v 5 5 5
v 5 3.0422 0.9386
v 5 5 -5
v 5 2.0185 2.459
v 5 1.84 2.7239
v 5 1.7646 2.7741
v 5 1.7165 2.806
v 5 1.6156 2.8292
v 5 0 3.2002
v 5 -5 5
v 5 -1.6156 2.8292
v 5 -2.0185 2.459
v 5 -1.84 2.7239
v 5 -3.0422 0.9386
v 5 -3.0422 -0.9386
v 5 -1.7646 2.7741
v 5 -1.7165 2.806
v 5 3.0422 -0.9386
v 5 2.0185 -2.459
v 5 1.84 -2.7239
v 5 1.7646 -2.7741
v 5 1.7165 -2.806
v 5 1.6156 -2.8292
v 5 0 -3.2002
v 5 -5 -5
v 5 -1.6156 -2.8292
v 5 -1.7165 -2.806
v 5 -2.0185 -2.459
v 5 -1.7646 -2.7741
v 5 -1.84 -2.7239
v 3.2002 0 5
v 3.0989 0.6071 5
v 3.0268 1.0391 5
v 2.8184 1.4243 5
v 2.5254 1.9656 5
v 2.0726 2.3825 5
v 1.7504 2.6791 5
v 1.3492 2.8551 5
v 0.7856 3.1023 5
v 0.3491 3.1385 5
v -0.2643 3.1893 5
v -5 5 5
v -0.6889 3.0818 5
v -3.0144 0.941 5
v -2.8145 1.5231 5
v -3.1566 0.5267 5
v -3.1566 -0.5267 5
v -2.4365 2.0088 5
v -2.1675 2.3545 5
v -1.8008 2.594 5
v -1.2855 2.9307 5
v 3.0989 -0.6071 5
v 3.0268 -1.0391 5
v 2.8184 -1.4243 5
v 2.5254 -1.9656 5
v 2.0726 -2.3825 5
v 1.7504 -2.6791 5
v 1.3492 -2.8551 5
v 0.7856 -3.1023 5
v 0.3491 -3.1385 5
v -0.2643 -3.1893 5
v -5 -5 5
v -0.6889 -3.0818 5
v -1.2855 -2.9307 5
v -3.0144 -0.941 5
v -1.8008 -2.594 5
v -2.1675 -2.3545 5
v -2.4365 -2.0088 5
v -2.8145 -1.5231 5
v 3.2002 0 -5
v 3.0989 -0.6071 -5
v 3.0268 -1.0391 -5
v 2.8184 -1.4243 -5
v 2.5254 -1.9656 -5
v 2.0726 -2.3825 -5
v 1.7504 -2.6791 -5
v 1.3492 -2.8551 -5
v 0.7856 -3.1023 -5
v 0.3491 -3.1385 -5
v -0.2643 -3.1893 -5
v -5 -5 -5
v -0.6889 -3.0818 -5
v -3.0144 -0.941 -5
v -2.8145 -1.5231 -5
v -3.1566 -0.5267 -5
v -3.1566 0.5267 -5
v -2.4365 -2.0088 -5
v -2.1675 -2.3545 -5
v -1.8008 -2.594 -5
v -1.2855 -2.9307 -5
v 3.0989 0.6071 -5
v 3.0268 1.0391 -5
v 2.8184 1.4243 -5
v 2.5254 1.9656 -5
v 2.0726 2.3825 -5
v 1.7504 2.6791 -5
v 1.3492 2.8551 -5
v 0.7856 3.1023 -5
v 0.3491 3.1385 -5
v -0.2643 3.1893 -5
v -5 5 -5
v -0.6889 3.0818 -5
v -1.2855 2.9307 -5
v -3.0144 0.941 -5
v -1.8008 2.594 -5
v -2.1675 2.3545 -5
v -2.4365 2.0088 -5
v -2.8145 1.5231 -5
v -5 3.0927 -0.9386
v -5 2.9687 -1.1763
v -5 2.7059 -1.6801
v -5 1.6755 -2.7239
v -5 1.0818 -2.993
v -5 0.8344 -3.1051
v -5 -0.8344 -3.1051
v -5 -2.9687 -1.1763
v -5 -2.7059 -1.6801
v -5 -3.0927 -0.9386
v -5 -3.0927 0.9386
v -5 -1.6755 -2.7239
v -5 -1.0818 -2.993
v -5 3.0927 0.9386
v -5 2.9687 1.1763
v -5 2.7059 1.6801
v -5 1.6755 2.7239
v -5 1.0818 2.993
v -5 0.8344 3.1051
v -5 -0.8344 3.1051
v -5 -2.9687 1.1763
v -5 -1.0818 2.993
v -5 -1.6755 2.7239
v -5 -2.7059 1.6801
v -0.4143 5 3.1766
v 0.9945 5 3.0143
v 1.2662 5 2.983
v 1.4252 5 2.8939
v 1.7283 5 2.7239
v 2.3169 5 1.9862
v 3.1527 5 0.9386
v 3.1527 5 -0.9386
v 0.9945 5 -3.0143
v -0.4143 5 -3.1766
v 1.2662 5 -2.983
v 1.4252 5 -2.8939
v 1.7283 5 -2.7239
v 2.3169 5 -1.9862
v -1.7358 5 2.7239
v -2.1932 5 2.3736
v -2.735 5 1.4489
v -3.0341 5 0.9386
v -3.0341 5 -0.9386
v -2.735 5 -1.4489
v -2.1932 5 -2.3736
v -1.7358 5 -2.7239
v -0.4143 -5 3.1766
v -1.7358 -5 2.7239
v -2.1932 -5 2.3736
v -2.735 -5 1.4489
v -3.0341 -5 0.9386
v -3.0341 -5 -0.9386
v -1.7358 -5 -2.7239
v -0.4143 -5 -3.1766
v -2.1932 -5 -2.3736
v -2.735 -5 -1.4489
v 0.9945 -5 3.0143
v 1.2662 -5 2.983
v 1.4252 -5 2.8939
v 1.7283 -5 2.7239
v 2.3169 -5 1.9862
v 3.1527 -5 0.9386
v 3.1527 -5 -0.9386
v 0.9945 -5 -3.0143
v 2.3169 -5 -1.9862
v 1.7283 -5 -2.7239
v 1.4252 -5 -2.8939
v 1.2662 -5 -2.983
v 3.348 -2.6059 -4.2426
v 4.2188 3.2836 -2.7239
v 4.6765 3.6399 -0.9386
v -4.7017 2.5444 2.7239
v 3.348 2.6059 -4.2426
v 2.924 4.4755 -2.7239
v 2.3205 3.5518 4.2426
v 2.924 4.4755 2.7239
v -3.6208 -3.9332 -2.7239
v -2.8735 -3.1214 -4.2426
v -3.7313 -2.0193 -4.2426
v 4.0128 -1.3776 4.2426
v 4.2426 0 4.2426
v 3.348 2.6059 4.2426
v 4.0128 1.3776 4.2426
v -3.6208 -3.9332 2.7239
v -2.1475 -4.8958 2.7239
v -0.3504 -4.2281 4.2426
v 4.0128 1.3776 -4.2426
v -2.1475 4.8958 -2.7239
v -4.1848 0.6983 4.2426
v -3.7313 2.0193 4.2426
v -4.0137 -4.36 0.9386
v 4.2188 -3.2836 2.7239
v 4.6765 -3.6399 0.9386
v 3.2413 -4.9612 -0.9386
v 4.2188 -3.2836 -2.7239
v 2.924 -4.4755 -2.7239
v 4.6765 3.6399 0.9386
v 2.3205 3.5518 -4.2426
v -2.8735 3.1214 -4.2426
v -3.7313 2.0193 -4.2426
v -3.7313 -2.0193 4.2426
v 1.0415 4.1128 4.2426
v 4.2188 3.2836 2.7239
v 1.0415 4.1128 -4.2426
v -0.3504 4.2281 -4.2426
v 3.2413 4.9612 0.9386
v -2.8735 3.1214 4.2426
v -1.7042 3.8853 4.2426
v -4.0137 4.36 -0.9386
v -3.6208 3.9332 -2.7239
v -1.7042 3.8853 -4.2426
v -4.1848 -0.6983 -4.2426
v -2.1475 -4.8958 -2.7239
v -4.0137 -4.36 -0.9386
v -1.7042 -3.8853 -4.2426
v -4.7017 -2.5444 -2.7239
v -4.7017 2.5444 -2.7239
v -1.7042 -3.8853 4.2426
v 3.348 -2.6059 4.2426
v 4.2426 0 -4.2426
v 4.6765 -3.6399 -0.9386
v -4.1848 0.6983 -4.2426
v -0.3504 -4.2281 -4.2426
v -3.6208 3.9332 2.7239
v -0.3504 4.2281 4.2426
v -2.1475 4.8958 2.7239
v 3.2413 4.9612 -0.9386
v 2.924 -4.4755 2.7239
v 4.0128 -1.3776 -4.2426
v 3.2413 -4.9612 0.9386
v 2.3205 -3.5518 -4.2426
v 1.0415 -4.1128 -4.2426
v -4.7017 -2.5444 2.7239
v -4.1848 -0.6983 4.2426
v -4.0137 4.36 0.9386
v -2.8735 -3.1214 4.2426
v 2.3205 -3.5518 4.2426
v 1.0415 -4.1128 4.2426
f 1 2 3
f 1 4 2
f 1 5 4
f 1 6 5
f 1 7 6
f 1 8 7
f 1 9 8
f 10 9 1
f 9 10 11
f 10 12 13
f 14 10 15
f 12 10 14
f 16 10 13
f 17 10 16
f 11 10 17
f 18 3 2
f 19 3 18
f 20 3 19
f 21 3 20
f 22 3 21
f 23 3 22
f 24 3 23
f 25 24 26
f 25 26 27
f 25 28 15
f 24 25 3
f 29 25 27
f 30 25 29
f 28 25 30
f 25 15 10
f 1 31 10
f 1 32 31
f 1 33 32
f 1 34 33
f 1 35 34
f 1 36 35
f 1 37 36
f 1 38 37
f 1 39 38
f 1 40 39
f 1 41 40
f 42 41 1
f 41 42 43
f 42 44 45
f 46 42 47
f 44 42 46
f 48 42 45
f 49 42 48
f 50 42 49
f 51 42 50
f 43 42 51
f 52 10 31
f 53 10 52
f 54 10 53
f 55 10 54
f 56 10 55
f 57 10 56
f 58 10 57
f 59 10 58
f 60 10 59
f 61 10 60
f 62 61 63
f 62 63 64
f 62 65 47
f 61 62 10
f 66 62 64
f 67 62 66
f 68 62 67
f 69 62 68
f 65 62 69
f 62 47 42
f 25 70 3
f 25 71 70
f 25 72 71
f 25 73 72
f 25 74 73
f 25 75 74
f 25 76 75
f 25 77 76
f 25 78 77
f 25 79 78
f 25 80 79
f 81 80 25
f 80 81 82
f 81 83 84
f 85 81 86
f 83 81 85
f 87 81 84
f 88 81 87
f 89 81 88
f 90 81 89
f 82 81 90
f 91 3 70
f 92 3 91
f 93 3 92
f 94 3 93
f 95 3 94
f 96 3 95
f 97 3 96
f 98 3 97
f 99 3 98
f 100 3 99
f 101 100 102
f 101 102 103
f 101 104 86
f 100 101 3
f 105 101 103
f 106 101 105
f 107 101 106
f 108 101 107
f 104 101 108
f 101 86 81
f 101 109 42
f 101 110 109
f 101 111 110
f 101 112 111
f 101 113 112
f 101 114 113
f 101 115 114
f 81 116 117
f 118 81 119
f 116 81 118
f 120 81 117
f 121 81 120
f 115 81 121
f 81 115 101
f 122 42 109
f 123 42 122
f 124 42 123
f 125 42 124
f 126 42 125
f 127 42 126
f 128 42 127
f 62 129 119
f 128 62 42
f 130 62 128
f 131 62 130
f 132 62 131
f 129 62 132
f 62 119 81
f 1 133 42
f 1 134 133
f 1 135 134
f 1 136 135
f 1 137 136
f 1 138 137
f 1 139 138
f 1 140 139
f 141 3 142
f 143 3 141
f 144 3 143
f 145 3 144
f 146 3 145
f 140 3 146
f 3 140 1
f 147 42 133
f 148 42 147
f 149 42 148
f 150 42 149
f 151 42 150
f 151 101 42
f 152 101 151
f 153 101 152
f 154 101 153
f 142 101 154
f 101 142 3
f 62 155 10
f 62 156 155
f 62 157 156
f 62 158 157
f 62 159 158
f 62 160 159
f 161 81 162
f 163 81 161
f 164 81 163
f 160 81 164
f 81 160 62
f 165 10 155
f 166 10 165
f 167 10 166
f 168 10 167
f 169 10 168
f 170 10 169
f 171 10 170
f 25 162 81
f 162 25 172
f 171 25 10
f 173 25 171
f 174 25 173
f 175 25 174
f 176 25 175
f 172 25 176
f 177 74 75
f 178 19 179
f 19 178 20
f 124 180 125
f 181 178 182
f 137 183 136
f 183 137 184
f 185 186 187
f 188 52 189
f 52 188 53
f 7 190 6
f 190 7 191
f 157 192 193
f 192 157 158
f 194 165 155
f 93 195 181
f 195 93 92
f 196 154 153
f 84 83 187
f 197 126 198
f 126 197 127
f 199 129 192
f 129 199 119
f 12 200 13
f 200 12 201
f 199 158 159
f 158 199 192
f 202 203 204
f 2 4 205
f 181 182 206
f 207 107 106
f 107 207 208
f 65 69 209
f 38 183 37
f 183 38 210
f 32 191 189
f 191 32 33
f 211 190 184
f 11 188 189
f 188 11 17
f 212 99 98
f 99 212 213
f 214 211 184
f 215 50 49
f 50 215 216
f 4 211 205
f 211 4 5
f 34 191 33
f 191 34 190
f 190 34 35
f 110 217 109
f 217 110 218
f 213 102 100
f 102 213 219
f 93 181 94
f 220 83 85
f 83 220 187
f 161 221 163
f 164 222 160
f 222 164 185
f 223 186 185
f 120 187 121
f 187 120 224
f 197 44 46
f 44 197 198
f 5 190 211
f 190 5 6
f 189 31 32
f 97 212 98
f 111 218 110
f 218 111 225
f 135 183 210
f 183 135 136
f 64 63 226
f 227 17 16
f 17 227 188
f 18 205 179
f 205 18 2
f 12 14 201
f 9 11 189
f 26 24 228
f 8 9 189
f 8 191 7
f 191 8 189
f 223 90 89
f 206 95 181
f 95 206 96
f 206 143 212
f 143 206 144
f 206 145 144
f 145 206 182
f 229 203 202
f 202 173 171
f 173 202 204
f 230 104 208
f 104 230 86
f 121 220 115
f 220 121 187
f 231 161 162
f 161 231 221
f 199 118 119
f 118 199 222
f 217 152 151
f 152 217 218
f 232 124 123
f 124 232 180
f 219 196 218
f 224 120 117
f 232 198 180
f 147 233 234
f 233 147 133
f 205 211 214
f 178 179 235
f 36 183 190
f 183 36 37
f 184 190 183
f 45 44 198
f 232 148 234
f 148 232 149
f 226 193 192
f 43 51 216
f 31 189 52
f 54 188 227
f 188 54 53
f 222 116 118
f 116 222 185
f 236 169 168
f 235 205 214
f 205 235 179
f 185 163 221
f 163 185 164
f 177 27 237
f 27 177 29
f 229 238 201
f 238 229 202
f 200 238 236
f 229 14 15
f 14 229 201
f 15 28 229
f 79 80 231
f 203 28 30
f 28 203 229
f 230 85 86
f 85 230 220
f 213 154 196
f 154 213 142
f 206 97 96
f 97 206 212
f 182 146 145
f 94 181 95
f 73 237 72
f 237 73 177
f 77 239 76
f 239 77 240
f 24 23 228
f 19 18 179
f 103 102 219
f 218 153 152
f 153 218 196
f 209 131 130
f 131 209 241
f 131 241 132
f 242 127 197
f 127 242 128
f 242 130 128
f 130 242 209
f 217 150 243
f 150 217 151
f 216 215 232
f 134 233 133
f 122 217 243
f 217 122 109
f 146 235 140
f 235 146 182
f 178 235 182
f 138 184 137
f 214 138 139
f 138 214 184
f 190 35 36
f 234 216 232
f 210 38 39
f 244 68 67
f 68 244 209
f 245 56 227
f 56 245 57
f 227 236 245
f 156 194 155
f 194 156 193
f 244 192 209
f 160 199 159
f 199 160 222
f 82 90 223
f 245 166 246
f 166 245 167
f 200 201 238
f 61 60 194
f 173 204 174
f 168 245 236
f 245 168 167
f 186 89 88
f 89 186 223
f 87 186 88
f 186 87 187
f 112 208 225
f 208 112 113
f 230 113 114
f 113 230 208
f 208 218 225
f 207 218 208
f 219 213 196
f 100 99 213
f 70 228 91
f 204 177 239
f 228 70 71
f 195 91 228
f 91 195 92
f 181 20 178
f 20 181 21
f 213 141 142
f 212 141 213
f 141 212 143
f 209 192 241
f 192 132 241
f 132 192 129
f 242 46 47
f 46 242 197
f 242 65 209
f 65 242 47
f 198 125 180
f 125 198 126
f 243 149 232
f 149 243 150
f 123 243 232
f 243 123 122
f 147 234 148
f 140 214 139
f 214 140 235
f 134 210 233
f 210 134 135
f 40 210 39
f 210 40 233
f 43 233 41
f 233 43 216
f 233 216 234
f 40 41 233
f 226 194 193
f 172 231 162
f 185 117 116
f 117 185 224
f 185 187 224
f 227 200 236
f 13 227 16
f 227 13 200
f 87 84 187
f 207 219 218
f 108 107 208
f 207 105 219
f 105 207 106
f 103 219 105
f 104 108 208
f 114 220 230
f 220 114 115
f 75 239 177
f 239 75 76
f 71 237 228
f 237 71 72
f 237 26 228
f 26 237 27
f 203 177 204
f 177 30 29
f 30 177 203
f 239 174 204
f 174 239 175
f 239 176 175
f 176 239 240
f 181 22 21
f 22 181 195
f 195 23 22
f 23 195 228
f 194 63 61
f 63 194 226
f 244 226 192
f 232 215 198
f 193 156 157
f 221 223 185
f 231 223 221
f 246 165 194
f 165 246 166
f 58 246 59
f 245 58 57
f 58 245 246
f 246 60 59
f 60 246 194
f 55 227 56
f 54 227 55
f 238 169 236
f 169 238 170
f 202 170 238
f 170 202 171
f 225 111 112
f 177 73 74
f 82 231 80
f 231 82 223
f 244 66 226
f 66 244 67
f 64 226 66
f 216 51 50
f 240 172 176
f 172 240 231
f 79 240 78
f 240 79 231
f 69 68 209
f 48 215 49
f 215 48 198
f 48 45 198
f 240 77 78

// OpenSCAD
// Cube with a spherical bite — tests inverted normals on difference surface
difference() {
    cube([10, 10, 10], center=true);
    sphere(r=6);
}
